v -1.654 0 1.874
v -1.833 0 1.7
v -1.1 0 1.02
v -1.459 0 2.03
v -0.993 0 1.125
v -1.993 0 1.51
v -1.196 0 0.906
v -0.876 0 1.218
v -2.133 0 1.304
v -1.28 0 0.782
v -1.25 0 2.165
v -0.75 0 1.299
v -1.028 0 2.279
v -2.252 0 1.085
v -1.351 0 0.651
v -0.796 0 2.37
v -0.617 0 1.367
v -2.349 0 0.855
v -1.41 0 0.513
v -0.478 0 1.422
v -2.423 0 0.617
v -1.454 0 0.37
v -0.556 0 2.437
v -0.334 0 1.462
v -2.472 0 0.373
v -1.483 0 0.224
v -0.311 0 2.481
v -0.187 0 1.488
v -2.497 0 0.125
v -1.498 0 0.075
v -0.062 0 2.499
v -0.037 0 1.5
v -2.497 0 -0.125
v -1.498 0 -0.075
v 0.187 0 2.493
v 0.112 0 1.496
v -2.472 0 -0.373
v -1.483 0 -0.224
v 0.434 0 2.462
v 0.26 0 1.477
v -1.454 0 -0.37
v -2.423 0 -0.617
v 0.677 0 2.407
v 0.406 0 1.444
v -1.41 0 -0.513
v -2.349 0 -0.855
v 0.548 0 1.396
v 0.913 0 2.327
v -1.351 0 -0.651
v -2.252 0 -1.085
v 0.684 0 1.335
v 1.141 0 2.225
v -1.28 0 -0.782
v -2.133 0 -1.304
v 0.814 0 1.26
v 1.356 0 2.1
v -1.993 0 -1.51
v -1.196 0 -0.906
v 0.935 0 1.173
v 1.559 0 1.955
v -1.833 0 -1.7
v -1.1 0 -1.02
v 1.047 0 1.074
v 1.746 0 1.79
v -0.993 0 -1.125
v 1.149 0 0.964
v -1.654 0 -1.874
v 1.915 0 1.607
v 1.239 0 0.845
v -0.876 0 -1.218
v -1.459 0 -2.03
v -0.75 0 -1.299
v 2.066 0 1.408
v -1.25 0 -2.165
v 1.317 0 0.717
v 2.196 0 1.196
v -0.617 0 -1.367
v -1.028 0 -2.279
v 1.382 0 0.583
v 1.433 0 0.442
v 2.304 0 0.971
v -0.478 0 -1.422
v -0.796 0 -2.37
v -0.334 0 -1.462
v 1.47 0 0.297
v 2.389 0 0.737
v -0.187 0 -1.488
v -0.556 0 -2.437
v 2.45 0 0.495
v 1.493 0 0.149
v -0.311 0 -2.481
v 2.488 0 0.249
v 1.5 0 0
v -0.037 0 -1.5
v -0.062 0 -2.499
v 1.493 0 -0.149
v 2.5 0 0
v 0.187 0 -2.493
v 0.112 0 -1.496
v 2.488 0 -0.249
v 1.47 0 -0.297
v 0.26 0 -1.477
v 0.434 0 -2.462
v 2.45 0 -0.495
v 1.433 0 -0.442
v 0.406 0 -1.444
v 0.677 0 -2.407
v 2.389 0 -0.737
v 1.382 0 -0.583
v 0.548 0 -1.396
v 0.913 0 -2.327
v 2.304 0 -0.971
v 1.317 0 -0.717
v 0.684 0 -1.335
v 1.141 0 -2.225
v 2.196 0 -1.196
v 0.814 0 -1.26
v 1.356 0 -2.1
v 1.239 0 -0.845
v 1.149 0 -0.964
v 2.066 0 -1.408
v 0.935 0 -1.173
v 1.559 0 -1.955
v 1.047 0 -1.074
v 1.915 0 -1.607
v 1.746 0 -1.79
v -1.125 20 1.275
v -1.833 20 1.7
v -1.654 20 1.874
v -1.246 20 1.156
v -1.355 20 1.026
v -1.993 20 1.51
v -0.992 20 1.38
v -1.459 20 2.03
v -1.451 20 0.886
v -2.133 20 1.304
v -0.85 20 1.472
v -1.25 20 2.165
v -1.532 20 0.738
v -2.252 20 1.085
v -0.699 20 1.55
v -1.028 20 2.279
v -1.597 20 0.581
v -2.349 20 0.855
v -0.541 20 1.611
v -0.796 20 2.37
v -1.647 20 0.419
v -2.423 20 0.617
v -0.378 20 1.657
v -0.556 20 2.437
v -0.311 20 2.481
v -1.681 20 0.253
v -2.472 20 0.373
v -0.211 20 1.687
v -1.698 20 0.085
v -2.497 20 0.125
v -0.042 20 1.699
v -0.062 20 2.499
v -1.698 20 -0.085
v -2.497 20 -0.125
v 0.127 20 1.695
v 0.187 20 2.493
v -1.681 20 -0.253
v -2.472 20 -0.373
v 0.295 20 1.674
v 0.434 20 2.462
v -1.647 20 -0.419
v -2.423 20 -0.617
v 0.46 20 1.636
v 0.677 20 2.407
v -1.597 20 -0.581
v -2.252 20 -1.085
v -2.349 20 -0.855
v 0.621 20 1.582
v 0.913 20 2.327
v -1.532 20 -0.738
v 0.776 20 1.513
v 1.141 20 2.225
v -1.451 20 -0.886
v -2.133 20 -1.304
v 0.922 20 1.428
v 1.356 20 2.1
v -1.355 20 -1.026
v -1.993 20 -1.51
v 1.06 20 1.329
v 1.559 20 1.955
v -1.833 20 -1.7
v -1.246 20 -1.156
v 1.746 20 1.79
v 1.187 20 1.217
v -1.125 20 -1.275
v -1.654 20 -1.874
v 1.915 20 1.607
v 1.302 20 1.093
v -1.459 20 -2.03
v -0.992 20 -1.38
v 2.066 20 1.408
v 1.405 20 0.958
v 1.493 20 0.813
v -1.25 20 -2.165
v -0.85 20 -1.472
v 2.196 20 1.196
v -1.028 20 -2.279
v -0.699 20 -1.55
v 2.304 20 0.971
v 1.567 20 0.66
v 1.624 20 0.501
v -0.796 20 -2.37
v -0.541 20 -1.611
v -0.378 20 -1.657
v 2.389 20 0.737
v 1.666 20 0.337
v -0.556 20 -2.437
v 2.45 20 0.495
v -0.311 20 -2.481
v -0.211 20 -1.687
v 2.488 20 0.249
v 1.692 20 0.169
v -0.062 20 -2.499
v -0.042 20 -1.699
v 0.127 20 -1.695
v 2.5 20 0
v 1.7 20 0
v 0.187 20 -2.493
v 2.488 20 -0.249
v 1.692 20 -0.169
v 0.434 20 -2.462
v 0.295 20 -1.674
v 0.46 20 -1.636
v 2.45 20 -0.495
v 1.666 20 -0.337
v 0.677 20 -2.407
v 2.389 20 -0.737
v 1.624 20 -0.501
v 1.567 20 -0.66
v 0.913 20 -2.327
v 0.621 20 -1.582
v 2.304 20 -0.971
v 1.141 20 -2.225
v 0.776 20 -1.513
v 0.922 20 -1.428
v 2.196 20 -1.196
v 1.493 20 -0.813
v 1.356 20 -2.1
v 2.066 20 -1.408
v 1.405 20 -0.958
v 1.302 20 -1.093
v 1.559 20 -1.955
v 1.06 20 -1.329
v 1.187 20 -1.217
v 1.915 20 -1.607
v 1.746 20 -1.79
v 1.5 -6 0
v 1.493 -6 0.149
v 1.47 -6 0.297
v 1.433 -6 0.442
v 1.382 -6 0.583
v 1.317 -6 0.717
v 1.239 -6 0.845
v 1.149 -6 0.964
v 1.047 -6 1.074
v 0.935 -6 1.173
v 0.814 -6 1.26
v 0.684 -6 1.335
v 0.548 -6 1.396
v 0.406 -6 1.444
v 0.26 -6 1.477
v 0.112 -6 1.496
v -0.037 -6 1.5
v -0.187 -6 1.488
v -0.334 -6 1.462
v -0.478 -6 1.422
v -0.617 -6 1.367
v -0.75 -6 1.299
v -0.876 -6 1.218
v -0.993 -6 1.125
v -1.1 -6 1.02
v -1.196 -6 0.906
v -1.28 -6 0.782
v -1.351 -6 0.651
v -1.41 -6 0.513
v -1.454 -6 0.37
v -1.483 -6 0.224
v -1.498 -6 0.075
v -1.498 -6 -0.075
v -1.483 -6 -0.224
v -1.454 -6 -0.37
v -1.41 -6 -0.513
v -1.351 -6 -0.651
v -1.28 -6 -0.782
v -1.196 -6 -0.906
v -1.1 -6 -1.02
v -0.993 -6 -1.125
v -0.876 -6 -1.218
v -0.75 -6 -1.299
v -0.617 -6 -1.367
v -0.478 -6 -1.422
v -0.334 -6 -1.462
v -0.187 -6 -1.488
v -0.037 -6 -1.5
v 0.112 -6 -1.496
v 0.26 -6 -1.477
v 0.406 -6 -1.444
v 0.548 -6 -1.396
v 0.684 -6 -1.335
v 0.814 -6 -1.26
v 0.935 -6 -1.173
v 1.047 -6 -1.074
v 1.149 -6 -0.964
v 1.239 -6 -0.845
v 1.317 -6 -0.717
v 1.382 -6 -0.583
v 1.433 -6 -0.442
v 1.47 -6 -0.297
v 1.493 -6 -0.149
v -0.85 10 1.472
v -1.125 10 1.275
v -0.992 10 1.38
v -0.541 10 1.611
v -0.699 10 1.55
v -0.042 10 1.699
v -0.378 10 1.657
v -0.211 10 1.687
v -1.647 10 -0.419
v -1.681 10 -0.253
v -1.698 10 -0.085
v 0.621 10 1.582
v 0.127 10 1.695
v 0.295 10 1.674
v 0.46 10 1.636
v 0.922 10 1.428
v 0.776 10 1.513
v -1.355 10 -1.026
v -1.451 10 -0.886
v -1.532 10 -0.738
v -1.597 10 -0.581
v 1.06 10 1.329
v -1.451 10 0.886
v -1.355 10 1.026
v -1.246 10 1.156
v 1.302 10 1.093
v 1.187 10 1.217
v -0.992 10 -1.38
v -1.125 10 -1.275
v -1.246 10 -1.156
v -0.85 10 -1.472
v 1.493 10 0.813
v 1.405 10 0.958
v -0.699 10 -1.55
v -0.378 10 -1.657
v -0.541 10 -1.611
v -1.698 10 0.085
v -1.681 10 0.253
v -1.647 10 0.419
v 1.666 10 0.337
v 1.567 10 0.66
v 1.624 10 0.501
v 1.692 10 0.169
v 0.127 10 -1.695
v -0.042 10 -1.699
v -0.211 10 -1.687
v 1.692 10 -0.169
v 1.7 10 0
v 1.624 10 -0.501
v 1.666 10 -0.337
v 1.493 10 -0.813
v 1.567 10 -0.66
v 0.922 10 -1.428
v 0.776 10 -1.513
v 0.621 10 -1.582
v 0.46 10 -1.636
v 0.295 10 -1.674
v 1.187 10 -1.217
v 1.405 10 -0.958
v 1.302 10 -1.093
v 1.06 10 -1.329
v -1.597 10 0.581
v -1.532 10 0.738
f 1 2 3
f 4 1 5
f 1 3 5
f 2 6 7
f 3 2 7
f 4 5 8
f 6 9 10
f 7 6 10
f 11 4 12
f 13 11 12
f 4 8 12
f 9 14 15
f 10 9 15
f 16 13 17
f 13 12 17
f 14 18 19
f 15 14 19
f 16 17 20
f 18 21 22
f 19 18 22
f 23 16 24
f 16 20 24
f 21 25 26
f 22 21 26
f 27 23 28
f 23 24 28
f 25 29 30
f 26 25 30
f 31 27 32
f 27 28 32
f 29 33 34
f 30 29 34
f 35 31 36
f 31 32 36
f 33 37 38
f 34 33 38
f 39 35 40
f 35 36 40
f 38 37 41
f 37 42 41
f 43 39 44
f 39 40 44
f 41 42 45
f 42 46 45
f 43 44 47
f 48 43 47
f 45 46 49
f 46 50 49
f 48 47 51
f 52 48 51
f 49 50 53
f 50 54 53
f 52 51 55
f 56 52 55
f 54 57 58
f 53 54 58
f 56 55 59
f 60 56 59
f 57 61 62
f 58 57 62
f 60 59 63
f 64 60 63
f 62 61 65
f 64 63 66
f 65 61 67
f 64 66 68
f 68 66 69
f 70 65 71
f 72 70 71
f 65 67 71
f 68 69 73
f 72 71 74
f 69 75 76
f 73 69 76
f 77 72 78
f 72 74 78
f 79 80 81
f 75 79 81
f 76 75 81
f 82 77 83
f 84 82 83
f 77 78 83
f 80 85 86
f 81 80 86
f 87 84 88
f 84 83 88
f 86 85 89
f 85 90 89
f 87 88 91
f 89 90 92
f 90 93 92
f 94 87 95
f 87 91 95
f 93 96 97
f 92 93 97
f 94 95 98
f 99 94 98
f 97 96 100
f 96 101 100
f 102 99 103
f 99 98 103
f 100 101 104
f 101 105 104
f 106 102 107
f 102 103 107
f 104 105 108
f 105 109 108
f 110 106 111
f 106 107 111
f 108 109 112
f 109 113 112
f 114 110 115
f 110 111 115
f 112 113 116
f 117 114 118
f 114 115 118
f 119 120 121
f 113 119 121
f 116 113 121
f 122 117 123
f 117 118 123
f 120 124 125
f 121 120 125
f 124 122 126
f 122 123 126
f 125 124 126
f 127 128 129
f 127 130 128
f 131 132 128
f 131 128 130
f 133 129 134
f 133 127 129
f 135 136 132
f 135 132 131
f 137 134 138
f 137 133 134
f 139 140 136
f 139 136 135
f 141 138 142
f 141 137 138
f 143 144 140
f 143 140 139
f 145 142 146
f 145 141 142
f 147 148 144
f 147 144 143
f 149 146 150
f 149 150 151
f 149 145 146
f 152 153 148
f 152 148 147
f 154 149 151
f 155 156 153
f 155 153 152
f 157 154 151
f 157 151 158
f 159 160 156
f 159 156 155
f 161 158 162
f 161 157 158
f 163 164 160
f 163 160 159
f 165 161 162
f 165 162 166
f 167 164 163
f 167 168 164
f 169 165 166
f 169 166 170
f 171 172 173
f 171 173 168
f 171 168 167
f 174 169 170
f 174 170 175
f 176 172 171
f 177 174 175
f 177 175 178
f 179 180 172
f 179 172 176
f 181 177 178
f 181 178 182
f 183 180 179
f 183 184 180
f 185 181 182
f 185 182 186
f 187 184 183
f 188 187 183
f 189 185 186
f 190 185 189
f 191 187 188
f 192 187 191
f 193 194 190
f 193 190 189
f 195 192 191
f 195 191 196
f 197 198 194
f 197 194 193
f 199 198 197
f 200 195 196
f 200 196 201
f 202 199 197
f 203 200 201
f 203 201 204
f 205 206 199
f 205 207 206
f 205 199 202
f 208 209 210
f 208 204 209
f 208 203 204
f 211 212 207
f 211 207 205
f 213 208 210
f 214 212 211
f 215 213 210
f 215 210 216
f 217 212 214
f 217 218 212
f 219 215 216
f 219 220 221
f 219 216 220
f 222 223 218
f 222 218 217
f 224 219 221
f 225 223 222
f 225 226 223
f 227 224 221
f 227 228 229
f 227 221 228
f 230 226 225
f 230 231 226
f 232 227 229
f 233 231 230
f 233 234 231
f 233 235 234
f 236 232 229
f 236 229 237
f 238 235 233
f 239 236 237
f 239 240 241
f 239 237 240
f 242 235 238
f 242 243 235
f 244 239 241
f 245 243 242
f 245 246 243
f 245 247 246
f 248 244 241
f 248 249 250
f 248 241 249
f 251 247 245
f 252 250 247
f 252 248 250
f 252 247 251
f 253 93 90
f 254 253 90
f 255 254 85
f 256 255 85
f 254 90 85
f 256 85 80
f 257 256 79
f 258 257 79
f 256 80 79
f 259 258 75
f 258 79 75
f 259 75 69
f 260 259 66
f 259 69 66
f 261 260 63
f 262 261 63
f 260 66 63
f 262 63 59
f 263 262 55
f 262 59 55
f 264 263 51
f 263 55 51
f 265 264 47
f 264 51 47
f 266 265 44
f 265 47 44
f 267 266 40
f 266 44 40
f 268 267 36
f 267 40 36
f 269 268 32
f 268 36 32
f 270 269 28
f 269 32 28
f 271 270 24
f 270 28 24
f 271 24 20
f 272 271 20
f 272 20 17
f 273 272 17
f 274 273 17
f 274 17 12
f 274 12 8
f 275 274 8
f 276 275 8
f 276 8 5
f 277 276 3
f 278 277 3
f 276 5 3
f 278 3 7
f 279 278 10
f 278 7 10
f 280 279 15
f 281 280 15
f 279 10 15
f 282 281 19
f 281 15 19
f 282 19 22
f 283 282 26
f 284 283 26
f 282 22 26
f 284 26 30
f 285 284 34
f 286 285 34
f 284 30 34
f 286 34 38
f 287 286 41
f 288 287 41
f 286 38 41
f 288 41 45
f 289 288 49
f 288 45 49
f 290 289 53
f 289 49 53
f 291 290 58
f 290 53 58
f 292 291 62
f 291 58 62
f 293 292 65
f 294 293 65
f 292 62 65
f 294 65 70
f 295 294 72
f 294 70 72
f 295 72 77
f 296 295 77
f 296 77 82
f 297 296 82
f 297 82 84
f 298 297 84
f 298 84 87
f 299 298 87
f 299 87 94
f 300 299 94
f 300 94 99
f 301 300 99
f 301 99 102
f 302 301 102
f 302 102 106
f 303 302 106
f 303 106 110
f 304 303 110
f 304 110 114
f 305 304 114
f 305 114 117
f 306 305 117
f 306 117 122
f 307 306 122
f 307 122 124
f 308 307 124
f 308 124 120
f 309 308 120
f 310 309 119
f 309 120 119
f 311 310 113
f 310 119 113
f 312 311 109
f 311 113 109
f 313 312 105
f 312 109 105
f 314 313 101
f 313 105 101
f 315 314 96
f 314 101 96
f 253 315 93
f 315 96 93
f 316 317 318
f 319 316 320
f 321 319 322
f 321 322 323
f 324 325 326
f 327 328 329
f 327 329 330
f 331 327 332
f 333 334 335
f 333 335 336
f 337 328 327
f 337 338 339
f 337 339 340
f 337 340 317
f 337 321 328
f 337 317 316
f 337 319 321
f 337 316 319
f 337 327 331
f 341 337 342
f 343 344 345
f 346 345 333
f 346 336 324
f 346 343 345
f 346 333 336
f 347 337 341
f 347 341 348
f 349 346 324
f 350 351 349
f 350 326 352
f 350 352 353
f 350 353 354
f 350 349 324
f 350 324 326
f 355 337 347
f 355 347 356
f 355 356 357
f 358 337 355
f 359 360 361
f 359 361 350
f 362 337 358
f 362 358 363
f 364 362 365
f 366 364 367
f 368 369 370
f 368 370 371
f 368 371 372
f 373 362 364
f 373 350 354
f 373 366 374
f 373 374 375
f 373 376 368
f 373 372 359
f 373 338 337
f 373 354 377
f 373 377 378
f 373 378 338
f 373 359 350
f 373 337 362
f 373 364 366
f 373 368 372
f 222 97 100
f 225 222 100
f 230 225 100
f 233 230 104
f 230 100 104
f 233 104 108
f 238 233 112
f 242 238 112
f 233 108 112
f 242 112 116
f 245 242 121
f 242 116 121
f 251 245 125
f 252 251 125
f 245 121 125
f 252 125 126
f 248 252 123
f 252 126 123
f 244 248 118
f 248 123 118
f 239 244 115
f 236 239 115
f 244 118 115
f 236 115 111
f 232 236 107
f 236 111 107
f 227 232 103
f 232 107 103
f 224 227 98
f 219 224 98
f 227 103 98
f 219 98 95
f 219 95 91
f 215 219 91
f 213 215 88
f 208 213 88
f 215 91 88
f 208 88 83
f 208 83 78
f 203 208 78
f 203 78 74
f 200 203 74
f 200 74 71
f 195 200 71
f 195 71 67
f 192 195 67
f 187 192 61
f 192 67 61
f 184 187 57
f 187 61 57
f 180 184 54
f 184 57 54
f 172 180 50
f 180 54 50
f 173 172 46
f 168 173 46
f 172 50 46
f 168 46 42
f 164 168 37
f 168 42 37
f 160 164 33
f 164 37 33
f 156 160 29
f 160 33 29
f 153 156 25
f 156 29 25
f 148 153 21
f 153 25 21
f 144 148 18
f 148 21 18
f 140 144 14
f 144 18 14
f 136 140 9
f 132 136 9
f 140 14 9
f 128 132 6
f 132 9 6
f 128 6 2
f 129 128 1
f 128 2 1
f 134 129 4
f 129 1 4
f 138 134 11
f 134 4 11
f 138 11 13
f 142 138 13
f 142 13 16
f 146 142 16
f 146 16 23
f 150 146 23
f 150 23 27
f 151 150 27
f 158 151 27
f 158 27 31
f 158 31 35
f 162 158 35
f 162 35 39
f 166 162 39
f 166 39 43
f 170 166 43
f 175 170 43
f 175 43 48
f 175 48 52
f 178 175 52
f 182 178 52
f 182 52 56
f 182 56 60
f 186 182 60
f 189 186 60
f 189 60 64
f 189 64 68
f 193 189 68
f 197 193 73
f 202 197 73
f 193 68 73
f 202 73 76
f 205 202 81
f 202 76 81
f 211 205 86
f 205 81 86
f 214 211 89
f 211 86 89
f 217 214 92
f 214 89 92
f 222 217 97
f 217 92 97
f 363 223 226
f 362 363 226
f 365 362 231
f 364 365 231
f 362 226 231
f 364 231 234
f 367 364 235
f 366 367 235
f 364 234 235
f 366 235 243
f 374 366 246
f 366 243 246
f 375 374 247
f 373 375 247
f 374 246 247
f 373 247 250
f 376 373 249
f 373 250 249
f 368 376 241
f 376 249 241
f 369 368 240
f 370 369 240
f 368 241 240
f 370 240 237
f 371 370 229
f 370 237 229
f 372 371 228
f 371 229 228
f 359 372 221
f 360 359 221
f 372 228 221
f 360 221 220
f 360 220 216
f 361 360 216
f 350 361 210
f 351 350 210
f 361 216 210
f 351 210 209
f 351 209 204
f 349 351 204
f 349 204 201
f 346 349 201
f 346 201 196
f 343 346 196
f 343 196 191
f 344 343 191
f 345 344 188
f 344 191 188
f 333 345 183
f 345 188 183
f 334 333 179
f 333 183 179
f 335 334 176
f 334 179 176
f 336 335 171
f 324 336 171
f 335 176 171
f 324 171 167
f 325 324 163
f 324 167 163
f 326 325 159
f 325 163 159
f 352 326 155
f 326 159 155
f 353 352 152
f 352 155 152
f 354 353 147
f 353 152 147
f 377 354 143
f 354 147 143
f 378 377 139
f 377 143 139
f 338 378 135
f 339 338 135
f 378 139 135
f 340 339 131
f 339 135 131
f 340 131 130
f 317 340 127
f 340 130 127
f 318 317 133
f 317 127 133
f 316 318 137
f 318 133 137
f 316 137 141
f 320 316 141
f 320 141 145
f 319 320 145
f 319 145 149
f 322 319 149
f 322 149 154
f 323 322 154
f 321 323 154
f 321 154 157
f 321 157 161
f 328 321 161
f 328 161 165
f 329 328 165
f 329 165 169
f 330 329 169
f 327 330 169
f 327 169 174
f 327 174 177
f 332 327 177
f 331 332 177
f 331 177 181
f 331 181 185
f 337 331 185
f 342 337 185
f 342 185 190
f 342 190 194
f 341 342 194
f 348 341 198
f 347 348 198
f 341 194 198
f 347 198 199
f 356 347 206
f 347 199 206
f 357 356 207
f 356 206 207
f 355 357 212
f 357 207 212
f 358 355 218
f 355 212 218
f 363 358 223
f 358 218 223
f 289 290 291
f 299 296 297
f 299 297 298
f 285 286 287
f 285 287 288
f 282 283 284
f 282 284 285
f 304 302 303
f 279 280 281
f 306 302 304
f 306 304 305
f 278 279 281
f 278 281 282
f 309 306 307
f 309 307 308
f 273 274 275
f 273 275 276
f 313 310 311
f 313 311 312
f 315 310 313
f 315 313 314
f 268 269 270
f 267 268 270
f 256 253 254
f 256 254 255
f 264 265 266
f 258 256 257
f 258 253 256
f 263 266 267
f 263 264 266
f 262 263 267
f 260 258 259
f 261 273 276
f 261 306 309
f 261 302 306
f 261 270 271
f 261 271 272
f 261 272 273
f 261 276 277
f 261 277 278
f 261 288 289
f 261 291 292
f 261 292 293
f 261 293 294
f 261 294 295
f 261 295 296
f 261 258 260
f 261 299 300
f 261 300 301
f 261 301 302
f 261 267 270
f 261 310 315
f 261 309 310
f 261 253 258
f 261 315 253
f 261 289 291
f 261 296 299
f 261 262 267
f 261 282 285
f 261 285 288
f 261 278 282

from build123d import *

# Parameters (mm, degrees)
ESQUISSE1_R             = 2.5
BOSS_EXTRU_1_DEPTH      = 20
ESQUISSE2_R             = 1.5
BOSS_EXTRU_2_DEPTH      = 6
ESQUISSE6_R             = 1.7
ENL_V_MAT_EXTRU_1_DEPTH = 10


with BuildPart() as part:
    # Esquisse1 → Boss.-Extru.1 (new body)
    with BuildSketch(Plane(origin=(0, 0, 0), x_dir=(1, 0, 0), z_dir=(0, 1, 0))):
        Circle(ESQUISSE1_R)
    extrude(amount=BOSS_EXTRU_1_DEPTH)

    # Esquisse2 → Boss.-Extru.2 (add)
    with BuildSketch(Plane.XZ):
        Circle(ESQUISSE2_R)
    extrude(amount=BOSS_EXTRU_2_DEPTH)

    # Esquisse6 → Enlèv. mat.-Extru.1 (cut)
    with BuildSketch(Plane(origin=(0, 20, 0), x_dir=(1, 0, 0), z_dir=(0, 1, 0))):
        Circle(ESQUISSE6_R)
    extrude(amount=-ENL_V_MAT_EXTRU_1_DEPTH, mode=Mode.SUBTRACT)


solid = part.part
